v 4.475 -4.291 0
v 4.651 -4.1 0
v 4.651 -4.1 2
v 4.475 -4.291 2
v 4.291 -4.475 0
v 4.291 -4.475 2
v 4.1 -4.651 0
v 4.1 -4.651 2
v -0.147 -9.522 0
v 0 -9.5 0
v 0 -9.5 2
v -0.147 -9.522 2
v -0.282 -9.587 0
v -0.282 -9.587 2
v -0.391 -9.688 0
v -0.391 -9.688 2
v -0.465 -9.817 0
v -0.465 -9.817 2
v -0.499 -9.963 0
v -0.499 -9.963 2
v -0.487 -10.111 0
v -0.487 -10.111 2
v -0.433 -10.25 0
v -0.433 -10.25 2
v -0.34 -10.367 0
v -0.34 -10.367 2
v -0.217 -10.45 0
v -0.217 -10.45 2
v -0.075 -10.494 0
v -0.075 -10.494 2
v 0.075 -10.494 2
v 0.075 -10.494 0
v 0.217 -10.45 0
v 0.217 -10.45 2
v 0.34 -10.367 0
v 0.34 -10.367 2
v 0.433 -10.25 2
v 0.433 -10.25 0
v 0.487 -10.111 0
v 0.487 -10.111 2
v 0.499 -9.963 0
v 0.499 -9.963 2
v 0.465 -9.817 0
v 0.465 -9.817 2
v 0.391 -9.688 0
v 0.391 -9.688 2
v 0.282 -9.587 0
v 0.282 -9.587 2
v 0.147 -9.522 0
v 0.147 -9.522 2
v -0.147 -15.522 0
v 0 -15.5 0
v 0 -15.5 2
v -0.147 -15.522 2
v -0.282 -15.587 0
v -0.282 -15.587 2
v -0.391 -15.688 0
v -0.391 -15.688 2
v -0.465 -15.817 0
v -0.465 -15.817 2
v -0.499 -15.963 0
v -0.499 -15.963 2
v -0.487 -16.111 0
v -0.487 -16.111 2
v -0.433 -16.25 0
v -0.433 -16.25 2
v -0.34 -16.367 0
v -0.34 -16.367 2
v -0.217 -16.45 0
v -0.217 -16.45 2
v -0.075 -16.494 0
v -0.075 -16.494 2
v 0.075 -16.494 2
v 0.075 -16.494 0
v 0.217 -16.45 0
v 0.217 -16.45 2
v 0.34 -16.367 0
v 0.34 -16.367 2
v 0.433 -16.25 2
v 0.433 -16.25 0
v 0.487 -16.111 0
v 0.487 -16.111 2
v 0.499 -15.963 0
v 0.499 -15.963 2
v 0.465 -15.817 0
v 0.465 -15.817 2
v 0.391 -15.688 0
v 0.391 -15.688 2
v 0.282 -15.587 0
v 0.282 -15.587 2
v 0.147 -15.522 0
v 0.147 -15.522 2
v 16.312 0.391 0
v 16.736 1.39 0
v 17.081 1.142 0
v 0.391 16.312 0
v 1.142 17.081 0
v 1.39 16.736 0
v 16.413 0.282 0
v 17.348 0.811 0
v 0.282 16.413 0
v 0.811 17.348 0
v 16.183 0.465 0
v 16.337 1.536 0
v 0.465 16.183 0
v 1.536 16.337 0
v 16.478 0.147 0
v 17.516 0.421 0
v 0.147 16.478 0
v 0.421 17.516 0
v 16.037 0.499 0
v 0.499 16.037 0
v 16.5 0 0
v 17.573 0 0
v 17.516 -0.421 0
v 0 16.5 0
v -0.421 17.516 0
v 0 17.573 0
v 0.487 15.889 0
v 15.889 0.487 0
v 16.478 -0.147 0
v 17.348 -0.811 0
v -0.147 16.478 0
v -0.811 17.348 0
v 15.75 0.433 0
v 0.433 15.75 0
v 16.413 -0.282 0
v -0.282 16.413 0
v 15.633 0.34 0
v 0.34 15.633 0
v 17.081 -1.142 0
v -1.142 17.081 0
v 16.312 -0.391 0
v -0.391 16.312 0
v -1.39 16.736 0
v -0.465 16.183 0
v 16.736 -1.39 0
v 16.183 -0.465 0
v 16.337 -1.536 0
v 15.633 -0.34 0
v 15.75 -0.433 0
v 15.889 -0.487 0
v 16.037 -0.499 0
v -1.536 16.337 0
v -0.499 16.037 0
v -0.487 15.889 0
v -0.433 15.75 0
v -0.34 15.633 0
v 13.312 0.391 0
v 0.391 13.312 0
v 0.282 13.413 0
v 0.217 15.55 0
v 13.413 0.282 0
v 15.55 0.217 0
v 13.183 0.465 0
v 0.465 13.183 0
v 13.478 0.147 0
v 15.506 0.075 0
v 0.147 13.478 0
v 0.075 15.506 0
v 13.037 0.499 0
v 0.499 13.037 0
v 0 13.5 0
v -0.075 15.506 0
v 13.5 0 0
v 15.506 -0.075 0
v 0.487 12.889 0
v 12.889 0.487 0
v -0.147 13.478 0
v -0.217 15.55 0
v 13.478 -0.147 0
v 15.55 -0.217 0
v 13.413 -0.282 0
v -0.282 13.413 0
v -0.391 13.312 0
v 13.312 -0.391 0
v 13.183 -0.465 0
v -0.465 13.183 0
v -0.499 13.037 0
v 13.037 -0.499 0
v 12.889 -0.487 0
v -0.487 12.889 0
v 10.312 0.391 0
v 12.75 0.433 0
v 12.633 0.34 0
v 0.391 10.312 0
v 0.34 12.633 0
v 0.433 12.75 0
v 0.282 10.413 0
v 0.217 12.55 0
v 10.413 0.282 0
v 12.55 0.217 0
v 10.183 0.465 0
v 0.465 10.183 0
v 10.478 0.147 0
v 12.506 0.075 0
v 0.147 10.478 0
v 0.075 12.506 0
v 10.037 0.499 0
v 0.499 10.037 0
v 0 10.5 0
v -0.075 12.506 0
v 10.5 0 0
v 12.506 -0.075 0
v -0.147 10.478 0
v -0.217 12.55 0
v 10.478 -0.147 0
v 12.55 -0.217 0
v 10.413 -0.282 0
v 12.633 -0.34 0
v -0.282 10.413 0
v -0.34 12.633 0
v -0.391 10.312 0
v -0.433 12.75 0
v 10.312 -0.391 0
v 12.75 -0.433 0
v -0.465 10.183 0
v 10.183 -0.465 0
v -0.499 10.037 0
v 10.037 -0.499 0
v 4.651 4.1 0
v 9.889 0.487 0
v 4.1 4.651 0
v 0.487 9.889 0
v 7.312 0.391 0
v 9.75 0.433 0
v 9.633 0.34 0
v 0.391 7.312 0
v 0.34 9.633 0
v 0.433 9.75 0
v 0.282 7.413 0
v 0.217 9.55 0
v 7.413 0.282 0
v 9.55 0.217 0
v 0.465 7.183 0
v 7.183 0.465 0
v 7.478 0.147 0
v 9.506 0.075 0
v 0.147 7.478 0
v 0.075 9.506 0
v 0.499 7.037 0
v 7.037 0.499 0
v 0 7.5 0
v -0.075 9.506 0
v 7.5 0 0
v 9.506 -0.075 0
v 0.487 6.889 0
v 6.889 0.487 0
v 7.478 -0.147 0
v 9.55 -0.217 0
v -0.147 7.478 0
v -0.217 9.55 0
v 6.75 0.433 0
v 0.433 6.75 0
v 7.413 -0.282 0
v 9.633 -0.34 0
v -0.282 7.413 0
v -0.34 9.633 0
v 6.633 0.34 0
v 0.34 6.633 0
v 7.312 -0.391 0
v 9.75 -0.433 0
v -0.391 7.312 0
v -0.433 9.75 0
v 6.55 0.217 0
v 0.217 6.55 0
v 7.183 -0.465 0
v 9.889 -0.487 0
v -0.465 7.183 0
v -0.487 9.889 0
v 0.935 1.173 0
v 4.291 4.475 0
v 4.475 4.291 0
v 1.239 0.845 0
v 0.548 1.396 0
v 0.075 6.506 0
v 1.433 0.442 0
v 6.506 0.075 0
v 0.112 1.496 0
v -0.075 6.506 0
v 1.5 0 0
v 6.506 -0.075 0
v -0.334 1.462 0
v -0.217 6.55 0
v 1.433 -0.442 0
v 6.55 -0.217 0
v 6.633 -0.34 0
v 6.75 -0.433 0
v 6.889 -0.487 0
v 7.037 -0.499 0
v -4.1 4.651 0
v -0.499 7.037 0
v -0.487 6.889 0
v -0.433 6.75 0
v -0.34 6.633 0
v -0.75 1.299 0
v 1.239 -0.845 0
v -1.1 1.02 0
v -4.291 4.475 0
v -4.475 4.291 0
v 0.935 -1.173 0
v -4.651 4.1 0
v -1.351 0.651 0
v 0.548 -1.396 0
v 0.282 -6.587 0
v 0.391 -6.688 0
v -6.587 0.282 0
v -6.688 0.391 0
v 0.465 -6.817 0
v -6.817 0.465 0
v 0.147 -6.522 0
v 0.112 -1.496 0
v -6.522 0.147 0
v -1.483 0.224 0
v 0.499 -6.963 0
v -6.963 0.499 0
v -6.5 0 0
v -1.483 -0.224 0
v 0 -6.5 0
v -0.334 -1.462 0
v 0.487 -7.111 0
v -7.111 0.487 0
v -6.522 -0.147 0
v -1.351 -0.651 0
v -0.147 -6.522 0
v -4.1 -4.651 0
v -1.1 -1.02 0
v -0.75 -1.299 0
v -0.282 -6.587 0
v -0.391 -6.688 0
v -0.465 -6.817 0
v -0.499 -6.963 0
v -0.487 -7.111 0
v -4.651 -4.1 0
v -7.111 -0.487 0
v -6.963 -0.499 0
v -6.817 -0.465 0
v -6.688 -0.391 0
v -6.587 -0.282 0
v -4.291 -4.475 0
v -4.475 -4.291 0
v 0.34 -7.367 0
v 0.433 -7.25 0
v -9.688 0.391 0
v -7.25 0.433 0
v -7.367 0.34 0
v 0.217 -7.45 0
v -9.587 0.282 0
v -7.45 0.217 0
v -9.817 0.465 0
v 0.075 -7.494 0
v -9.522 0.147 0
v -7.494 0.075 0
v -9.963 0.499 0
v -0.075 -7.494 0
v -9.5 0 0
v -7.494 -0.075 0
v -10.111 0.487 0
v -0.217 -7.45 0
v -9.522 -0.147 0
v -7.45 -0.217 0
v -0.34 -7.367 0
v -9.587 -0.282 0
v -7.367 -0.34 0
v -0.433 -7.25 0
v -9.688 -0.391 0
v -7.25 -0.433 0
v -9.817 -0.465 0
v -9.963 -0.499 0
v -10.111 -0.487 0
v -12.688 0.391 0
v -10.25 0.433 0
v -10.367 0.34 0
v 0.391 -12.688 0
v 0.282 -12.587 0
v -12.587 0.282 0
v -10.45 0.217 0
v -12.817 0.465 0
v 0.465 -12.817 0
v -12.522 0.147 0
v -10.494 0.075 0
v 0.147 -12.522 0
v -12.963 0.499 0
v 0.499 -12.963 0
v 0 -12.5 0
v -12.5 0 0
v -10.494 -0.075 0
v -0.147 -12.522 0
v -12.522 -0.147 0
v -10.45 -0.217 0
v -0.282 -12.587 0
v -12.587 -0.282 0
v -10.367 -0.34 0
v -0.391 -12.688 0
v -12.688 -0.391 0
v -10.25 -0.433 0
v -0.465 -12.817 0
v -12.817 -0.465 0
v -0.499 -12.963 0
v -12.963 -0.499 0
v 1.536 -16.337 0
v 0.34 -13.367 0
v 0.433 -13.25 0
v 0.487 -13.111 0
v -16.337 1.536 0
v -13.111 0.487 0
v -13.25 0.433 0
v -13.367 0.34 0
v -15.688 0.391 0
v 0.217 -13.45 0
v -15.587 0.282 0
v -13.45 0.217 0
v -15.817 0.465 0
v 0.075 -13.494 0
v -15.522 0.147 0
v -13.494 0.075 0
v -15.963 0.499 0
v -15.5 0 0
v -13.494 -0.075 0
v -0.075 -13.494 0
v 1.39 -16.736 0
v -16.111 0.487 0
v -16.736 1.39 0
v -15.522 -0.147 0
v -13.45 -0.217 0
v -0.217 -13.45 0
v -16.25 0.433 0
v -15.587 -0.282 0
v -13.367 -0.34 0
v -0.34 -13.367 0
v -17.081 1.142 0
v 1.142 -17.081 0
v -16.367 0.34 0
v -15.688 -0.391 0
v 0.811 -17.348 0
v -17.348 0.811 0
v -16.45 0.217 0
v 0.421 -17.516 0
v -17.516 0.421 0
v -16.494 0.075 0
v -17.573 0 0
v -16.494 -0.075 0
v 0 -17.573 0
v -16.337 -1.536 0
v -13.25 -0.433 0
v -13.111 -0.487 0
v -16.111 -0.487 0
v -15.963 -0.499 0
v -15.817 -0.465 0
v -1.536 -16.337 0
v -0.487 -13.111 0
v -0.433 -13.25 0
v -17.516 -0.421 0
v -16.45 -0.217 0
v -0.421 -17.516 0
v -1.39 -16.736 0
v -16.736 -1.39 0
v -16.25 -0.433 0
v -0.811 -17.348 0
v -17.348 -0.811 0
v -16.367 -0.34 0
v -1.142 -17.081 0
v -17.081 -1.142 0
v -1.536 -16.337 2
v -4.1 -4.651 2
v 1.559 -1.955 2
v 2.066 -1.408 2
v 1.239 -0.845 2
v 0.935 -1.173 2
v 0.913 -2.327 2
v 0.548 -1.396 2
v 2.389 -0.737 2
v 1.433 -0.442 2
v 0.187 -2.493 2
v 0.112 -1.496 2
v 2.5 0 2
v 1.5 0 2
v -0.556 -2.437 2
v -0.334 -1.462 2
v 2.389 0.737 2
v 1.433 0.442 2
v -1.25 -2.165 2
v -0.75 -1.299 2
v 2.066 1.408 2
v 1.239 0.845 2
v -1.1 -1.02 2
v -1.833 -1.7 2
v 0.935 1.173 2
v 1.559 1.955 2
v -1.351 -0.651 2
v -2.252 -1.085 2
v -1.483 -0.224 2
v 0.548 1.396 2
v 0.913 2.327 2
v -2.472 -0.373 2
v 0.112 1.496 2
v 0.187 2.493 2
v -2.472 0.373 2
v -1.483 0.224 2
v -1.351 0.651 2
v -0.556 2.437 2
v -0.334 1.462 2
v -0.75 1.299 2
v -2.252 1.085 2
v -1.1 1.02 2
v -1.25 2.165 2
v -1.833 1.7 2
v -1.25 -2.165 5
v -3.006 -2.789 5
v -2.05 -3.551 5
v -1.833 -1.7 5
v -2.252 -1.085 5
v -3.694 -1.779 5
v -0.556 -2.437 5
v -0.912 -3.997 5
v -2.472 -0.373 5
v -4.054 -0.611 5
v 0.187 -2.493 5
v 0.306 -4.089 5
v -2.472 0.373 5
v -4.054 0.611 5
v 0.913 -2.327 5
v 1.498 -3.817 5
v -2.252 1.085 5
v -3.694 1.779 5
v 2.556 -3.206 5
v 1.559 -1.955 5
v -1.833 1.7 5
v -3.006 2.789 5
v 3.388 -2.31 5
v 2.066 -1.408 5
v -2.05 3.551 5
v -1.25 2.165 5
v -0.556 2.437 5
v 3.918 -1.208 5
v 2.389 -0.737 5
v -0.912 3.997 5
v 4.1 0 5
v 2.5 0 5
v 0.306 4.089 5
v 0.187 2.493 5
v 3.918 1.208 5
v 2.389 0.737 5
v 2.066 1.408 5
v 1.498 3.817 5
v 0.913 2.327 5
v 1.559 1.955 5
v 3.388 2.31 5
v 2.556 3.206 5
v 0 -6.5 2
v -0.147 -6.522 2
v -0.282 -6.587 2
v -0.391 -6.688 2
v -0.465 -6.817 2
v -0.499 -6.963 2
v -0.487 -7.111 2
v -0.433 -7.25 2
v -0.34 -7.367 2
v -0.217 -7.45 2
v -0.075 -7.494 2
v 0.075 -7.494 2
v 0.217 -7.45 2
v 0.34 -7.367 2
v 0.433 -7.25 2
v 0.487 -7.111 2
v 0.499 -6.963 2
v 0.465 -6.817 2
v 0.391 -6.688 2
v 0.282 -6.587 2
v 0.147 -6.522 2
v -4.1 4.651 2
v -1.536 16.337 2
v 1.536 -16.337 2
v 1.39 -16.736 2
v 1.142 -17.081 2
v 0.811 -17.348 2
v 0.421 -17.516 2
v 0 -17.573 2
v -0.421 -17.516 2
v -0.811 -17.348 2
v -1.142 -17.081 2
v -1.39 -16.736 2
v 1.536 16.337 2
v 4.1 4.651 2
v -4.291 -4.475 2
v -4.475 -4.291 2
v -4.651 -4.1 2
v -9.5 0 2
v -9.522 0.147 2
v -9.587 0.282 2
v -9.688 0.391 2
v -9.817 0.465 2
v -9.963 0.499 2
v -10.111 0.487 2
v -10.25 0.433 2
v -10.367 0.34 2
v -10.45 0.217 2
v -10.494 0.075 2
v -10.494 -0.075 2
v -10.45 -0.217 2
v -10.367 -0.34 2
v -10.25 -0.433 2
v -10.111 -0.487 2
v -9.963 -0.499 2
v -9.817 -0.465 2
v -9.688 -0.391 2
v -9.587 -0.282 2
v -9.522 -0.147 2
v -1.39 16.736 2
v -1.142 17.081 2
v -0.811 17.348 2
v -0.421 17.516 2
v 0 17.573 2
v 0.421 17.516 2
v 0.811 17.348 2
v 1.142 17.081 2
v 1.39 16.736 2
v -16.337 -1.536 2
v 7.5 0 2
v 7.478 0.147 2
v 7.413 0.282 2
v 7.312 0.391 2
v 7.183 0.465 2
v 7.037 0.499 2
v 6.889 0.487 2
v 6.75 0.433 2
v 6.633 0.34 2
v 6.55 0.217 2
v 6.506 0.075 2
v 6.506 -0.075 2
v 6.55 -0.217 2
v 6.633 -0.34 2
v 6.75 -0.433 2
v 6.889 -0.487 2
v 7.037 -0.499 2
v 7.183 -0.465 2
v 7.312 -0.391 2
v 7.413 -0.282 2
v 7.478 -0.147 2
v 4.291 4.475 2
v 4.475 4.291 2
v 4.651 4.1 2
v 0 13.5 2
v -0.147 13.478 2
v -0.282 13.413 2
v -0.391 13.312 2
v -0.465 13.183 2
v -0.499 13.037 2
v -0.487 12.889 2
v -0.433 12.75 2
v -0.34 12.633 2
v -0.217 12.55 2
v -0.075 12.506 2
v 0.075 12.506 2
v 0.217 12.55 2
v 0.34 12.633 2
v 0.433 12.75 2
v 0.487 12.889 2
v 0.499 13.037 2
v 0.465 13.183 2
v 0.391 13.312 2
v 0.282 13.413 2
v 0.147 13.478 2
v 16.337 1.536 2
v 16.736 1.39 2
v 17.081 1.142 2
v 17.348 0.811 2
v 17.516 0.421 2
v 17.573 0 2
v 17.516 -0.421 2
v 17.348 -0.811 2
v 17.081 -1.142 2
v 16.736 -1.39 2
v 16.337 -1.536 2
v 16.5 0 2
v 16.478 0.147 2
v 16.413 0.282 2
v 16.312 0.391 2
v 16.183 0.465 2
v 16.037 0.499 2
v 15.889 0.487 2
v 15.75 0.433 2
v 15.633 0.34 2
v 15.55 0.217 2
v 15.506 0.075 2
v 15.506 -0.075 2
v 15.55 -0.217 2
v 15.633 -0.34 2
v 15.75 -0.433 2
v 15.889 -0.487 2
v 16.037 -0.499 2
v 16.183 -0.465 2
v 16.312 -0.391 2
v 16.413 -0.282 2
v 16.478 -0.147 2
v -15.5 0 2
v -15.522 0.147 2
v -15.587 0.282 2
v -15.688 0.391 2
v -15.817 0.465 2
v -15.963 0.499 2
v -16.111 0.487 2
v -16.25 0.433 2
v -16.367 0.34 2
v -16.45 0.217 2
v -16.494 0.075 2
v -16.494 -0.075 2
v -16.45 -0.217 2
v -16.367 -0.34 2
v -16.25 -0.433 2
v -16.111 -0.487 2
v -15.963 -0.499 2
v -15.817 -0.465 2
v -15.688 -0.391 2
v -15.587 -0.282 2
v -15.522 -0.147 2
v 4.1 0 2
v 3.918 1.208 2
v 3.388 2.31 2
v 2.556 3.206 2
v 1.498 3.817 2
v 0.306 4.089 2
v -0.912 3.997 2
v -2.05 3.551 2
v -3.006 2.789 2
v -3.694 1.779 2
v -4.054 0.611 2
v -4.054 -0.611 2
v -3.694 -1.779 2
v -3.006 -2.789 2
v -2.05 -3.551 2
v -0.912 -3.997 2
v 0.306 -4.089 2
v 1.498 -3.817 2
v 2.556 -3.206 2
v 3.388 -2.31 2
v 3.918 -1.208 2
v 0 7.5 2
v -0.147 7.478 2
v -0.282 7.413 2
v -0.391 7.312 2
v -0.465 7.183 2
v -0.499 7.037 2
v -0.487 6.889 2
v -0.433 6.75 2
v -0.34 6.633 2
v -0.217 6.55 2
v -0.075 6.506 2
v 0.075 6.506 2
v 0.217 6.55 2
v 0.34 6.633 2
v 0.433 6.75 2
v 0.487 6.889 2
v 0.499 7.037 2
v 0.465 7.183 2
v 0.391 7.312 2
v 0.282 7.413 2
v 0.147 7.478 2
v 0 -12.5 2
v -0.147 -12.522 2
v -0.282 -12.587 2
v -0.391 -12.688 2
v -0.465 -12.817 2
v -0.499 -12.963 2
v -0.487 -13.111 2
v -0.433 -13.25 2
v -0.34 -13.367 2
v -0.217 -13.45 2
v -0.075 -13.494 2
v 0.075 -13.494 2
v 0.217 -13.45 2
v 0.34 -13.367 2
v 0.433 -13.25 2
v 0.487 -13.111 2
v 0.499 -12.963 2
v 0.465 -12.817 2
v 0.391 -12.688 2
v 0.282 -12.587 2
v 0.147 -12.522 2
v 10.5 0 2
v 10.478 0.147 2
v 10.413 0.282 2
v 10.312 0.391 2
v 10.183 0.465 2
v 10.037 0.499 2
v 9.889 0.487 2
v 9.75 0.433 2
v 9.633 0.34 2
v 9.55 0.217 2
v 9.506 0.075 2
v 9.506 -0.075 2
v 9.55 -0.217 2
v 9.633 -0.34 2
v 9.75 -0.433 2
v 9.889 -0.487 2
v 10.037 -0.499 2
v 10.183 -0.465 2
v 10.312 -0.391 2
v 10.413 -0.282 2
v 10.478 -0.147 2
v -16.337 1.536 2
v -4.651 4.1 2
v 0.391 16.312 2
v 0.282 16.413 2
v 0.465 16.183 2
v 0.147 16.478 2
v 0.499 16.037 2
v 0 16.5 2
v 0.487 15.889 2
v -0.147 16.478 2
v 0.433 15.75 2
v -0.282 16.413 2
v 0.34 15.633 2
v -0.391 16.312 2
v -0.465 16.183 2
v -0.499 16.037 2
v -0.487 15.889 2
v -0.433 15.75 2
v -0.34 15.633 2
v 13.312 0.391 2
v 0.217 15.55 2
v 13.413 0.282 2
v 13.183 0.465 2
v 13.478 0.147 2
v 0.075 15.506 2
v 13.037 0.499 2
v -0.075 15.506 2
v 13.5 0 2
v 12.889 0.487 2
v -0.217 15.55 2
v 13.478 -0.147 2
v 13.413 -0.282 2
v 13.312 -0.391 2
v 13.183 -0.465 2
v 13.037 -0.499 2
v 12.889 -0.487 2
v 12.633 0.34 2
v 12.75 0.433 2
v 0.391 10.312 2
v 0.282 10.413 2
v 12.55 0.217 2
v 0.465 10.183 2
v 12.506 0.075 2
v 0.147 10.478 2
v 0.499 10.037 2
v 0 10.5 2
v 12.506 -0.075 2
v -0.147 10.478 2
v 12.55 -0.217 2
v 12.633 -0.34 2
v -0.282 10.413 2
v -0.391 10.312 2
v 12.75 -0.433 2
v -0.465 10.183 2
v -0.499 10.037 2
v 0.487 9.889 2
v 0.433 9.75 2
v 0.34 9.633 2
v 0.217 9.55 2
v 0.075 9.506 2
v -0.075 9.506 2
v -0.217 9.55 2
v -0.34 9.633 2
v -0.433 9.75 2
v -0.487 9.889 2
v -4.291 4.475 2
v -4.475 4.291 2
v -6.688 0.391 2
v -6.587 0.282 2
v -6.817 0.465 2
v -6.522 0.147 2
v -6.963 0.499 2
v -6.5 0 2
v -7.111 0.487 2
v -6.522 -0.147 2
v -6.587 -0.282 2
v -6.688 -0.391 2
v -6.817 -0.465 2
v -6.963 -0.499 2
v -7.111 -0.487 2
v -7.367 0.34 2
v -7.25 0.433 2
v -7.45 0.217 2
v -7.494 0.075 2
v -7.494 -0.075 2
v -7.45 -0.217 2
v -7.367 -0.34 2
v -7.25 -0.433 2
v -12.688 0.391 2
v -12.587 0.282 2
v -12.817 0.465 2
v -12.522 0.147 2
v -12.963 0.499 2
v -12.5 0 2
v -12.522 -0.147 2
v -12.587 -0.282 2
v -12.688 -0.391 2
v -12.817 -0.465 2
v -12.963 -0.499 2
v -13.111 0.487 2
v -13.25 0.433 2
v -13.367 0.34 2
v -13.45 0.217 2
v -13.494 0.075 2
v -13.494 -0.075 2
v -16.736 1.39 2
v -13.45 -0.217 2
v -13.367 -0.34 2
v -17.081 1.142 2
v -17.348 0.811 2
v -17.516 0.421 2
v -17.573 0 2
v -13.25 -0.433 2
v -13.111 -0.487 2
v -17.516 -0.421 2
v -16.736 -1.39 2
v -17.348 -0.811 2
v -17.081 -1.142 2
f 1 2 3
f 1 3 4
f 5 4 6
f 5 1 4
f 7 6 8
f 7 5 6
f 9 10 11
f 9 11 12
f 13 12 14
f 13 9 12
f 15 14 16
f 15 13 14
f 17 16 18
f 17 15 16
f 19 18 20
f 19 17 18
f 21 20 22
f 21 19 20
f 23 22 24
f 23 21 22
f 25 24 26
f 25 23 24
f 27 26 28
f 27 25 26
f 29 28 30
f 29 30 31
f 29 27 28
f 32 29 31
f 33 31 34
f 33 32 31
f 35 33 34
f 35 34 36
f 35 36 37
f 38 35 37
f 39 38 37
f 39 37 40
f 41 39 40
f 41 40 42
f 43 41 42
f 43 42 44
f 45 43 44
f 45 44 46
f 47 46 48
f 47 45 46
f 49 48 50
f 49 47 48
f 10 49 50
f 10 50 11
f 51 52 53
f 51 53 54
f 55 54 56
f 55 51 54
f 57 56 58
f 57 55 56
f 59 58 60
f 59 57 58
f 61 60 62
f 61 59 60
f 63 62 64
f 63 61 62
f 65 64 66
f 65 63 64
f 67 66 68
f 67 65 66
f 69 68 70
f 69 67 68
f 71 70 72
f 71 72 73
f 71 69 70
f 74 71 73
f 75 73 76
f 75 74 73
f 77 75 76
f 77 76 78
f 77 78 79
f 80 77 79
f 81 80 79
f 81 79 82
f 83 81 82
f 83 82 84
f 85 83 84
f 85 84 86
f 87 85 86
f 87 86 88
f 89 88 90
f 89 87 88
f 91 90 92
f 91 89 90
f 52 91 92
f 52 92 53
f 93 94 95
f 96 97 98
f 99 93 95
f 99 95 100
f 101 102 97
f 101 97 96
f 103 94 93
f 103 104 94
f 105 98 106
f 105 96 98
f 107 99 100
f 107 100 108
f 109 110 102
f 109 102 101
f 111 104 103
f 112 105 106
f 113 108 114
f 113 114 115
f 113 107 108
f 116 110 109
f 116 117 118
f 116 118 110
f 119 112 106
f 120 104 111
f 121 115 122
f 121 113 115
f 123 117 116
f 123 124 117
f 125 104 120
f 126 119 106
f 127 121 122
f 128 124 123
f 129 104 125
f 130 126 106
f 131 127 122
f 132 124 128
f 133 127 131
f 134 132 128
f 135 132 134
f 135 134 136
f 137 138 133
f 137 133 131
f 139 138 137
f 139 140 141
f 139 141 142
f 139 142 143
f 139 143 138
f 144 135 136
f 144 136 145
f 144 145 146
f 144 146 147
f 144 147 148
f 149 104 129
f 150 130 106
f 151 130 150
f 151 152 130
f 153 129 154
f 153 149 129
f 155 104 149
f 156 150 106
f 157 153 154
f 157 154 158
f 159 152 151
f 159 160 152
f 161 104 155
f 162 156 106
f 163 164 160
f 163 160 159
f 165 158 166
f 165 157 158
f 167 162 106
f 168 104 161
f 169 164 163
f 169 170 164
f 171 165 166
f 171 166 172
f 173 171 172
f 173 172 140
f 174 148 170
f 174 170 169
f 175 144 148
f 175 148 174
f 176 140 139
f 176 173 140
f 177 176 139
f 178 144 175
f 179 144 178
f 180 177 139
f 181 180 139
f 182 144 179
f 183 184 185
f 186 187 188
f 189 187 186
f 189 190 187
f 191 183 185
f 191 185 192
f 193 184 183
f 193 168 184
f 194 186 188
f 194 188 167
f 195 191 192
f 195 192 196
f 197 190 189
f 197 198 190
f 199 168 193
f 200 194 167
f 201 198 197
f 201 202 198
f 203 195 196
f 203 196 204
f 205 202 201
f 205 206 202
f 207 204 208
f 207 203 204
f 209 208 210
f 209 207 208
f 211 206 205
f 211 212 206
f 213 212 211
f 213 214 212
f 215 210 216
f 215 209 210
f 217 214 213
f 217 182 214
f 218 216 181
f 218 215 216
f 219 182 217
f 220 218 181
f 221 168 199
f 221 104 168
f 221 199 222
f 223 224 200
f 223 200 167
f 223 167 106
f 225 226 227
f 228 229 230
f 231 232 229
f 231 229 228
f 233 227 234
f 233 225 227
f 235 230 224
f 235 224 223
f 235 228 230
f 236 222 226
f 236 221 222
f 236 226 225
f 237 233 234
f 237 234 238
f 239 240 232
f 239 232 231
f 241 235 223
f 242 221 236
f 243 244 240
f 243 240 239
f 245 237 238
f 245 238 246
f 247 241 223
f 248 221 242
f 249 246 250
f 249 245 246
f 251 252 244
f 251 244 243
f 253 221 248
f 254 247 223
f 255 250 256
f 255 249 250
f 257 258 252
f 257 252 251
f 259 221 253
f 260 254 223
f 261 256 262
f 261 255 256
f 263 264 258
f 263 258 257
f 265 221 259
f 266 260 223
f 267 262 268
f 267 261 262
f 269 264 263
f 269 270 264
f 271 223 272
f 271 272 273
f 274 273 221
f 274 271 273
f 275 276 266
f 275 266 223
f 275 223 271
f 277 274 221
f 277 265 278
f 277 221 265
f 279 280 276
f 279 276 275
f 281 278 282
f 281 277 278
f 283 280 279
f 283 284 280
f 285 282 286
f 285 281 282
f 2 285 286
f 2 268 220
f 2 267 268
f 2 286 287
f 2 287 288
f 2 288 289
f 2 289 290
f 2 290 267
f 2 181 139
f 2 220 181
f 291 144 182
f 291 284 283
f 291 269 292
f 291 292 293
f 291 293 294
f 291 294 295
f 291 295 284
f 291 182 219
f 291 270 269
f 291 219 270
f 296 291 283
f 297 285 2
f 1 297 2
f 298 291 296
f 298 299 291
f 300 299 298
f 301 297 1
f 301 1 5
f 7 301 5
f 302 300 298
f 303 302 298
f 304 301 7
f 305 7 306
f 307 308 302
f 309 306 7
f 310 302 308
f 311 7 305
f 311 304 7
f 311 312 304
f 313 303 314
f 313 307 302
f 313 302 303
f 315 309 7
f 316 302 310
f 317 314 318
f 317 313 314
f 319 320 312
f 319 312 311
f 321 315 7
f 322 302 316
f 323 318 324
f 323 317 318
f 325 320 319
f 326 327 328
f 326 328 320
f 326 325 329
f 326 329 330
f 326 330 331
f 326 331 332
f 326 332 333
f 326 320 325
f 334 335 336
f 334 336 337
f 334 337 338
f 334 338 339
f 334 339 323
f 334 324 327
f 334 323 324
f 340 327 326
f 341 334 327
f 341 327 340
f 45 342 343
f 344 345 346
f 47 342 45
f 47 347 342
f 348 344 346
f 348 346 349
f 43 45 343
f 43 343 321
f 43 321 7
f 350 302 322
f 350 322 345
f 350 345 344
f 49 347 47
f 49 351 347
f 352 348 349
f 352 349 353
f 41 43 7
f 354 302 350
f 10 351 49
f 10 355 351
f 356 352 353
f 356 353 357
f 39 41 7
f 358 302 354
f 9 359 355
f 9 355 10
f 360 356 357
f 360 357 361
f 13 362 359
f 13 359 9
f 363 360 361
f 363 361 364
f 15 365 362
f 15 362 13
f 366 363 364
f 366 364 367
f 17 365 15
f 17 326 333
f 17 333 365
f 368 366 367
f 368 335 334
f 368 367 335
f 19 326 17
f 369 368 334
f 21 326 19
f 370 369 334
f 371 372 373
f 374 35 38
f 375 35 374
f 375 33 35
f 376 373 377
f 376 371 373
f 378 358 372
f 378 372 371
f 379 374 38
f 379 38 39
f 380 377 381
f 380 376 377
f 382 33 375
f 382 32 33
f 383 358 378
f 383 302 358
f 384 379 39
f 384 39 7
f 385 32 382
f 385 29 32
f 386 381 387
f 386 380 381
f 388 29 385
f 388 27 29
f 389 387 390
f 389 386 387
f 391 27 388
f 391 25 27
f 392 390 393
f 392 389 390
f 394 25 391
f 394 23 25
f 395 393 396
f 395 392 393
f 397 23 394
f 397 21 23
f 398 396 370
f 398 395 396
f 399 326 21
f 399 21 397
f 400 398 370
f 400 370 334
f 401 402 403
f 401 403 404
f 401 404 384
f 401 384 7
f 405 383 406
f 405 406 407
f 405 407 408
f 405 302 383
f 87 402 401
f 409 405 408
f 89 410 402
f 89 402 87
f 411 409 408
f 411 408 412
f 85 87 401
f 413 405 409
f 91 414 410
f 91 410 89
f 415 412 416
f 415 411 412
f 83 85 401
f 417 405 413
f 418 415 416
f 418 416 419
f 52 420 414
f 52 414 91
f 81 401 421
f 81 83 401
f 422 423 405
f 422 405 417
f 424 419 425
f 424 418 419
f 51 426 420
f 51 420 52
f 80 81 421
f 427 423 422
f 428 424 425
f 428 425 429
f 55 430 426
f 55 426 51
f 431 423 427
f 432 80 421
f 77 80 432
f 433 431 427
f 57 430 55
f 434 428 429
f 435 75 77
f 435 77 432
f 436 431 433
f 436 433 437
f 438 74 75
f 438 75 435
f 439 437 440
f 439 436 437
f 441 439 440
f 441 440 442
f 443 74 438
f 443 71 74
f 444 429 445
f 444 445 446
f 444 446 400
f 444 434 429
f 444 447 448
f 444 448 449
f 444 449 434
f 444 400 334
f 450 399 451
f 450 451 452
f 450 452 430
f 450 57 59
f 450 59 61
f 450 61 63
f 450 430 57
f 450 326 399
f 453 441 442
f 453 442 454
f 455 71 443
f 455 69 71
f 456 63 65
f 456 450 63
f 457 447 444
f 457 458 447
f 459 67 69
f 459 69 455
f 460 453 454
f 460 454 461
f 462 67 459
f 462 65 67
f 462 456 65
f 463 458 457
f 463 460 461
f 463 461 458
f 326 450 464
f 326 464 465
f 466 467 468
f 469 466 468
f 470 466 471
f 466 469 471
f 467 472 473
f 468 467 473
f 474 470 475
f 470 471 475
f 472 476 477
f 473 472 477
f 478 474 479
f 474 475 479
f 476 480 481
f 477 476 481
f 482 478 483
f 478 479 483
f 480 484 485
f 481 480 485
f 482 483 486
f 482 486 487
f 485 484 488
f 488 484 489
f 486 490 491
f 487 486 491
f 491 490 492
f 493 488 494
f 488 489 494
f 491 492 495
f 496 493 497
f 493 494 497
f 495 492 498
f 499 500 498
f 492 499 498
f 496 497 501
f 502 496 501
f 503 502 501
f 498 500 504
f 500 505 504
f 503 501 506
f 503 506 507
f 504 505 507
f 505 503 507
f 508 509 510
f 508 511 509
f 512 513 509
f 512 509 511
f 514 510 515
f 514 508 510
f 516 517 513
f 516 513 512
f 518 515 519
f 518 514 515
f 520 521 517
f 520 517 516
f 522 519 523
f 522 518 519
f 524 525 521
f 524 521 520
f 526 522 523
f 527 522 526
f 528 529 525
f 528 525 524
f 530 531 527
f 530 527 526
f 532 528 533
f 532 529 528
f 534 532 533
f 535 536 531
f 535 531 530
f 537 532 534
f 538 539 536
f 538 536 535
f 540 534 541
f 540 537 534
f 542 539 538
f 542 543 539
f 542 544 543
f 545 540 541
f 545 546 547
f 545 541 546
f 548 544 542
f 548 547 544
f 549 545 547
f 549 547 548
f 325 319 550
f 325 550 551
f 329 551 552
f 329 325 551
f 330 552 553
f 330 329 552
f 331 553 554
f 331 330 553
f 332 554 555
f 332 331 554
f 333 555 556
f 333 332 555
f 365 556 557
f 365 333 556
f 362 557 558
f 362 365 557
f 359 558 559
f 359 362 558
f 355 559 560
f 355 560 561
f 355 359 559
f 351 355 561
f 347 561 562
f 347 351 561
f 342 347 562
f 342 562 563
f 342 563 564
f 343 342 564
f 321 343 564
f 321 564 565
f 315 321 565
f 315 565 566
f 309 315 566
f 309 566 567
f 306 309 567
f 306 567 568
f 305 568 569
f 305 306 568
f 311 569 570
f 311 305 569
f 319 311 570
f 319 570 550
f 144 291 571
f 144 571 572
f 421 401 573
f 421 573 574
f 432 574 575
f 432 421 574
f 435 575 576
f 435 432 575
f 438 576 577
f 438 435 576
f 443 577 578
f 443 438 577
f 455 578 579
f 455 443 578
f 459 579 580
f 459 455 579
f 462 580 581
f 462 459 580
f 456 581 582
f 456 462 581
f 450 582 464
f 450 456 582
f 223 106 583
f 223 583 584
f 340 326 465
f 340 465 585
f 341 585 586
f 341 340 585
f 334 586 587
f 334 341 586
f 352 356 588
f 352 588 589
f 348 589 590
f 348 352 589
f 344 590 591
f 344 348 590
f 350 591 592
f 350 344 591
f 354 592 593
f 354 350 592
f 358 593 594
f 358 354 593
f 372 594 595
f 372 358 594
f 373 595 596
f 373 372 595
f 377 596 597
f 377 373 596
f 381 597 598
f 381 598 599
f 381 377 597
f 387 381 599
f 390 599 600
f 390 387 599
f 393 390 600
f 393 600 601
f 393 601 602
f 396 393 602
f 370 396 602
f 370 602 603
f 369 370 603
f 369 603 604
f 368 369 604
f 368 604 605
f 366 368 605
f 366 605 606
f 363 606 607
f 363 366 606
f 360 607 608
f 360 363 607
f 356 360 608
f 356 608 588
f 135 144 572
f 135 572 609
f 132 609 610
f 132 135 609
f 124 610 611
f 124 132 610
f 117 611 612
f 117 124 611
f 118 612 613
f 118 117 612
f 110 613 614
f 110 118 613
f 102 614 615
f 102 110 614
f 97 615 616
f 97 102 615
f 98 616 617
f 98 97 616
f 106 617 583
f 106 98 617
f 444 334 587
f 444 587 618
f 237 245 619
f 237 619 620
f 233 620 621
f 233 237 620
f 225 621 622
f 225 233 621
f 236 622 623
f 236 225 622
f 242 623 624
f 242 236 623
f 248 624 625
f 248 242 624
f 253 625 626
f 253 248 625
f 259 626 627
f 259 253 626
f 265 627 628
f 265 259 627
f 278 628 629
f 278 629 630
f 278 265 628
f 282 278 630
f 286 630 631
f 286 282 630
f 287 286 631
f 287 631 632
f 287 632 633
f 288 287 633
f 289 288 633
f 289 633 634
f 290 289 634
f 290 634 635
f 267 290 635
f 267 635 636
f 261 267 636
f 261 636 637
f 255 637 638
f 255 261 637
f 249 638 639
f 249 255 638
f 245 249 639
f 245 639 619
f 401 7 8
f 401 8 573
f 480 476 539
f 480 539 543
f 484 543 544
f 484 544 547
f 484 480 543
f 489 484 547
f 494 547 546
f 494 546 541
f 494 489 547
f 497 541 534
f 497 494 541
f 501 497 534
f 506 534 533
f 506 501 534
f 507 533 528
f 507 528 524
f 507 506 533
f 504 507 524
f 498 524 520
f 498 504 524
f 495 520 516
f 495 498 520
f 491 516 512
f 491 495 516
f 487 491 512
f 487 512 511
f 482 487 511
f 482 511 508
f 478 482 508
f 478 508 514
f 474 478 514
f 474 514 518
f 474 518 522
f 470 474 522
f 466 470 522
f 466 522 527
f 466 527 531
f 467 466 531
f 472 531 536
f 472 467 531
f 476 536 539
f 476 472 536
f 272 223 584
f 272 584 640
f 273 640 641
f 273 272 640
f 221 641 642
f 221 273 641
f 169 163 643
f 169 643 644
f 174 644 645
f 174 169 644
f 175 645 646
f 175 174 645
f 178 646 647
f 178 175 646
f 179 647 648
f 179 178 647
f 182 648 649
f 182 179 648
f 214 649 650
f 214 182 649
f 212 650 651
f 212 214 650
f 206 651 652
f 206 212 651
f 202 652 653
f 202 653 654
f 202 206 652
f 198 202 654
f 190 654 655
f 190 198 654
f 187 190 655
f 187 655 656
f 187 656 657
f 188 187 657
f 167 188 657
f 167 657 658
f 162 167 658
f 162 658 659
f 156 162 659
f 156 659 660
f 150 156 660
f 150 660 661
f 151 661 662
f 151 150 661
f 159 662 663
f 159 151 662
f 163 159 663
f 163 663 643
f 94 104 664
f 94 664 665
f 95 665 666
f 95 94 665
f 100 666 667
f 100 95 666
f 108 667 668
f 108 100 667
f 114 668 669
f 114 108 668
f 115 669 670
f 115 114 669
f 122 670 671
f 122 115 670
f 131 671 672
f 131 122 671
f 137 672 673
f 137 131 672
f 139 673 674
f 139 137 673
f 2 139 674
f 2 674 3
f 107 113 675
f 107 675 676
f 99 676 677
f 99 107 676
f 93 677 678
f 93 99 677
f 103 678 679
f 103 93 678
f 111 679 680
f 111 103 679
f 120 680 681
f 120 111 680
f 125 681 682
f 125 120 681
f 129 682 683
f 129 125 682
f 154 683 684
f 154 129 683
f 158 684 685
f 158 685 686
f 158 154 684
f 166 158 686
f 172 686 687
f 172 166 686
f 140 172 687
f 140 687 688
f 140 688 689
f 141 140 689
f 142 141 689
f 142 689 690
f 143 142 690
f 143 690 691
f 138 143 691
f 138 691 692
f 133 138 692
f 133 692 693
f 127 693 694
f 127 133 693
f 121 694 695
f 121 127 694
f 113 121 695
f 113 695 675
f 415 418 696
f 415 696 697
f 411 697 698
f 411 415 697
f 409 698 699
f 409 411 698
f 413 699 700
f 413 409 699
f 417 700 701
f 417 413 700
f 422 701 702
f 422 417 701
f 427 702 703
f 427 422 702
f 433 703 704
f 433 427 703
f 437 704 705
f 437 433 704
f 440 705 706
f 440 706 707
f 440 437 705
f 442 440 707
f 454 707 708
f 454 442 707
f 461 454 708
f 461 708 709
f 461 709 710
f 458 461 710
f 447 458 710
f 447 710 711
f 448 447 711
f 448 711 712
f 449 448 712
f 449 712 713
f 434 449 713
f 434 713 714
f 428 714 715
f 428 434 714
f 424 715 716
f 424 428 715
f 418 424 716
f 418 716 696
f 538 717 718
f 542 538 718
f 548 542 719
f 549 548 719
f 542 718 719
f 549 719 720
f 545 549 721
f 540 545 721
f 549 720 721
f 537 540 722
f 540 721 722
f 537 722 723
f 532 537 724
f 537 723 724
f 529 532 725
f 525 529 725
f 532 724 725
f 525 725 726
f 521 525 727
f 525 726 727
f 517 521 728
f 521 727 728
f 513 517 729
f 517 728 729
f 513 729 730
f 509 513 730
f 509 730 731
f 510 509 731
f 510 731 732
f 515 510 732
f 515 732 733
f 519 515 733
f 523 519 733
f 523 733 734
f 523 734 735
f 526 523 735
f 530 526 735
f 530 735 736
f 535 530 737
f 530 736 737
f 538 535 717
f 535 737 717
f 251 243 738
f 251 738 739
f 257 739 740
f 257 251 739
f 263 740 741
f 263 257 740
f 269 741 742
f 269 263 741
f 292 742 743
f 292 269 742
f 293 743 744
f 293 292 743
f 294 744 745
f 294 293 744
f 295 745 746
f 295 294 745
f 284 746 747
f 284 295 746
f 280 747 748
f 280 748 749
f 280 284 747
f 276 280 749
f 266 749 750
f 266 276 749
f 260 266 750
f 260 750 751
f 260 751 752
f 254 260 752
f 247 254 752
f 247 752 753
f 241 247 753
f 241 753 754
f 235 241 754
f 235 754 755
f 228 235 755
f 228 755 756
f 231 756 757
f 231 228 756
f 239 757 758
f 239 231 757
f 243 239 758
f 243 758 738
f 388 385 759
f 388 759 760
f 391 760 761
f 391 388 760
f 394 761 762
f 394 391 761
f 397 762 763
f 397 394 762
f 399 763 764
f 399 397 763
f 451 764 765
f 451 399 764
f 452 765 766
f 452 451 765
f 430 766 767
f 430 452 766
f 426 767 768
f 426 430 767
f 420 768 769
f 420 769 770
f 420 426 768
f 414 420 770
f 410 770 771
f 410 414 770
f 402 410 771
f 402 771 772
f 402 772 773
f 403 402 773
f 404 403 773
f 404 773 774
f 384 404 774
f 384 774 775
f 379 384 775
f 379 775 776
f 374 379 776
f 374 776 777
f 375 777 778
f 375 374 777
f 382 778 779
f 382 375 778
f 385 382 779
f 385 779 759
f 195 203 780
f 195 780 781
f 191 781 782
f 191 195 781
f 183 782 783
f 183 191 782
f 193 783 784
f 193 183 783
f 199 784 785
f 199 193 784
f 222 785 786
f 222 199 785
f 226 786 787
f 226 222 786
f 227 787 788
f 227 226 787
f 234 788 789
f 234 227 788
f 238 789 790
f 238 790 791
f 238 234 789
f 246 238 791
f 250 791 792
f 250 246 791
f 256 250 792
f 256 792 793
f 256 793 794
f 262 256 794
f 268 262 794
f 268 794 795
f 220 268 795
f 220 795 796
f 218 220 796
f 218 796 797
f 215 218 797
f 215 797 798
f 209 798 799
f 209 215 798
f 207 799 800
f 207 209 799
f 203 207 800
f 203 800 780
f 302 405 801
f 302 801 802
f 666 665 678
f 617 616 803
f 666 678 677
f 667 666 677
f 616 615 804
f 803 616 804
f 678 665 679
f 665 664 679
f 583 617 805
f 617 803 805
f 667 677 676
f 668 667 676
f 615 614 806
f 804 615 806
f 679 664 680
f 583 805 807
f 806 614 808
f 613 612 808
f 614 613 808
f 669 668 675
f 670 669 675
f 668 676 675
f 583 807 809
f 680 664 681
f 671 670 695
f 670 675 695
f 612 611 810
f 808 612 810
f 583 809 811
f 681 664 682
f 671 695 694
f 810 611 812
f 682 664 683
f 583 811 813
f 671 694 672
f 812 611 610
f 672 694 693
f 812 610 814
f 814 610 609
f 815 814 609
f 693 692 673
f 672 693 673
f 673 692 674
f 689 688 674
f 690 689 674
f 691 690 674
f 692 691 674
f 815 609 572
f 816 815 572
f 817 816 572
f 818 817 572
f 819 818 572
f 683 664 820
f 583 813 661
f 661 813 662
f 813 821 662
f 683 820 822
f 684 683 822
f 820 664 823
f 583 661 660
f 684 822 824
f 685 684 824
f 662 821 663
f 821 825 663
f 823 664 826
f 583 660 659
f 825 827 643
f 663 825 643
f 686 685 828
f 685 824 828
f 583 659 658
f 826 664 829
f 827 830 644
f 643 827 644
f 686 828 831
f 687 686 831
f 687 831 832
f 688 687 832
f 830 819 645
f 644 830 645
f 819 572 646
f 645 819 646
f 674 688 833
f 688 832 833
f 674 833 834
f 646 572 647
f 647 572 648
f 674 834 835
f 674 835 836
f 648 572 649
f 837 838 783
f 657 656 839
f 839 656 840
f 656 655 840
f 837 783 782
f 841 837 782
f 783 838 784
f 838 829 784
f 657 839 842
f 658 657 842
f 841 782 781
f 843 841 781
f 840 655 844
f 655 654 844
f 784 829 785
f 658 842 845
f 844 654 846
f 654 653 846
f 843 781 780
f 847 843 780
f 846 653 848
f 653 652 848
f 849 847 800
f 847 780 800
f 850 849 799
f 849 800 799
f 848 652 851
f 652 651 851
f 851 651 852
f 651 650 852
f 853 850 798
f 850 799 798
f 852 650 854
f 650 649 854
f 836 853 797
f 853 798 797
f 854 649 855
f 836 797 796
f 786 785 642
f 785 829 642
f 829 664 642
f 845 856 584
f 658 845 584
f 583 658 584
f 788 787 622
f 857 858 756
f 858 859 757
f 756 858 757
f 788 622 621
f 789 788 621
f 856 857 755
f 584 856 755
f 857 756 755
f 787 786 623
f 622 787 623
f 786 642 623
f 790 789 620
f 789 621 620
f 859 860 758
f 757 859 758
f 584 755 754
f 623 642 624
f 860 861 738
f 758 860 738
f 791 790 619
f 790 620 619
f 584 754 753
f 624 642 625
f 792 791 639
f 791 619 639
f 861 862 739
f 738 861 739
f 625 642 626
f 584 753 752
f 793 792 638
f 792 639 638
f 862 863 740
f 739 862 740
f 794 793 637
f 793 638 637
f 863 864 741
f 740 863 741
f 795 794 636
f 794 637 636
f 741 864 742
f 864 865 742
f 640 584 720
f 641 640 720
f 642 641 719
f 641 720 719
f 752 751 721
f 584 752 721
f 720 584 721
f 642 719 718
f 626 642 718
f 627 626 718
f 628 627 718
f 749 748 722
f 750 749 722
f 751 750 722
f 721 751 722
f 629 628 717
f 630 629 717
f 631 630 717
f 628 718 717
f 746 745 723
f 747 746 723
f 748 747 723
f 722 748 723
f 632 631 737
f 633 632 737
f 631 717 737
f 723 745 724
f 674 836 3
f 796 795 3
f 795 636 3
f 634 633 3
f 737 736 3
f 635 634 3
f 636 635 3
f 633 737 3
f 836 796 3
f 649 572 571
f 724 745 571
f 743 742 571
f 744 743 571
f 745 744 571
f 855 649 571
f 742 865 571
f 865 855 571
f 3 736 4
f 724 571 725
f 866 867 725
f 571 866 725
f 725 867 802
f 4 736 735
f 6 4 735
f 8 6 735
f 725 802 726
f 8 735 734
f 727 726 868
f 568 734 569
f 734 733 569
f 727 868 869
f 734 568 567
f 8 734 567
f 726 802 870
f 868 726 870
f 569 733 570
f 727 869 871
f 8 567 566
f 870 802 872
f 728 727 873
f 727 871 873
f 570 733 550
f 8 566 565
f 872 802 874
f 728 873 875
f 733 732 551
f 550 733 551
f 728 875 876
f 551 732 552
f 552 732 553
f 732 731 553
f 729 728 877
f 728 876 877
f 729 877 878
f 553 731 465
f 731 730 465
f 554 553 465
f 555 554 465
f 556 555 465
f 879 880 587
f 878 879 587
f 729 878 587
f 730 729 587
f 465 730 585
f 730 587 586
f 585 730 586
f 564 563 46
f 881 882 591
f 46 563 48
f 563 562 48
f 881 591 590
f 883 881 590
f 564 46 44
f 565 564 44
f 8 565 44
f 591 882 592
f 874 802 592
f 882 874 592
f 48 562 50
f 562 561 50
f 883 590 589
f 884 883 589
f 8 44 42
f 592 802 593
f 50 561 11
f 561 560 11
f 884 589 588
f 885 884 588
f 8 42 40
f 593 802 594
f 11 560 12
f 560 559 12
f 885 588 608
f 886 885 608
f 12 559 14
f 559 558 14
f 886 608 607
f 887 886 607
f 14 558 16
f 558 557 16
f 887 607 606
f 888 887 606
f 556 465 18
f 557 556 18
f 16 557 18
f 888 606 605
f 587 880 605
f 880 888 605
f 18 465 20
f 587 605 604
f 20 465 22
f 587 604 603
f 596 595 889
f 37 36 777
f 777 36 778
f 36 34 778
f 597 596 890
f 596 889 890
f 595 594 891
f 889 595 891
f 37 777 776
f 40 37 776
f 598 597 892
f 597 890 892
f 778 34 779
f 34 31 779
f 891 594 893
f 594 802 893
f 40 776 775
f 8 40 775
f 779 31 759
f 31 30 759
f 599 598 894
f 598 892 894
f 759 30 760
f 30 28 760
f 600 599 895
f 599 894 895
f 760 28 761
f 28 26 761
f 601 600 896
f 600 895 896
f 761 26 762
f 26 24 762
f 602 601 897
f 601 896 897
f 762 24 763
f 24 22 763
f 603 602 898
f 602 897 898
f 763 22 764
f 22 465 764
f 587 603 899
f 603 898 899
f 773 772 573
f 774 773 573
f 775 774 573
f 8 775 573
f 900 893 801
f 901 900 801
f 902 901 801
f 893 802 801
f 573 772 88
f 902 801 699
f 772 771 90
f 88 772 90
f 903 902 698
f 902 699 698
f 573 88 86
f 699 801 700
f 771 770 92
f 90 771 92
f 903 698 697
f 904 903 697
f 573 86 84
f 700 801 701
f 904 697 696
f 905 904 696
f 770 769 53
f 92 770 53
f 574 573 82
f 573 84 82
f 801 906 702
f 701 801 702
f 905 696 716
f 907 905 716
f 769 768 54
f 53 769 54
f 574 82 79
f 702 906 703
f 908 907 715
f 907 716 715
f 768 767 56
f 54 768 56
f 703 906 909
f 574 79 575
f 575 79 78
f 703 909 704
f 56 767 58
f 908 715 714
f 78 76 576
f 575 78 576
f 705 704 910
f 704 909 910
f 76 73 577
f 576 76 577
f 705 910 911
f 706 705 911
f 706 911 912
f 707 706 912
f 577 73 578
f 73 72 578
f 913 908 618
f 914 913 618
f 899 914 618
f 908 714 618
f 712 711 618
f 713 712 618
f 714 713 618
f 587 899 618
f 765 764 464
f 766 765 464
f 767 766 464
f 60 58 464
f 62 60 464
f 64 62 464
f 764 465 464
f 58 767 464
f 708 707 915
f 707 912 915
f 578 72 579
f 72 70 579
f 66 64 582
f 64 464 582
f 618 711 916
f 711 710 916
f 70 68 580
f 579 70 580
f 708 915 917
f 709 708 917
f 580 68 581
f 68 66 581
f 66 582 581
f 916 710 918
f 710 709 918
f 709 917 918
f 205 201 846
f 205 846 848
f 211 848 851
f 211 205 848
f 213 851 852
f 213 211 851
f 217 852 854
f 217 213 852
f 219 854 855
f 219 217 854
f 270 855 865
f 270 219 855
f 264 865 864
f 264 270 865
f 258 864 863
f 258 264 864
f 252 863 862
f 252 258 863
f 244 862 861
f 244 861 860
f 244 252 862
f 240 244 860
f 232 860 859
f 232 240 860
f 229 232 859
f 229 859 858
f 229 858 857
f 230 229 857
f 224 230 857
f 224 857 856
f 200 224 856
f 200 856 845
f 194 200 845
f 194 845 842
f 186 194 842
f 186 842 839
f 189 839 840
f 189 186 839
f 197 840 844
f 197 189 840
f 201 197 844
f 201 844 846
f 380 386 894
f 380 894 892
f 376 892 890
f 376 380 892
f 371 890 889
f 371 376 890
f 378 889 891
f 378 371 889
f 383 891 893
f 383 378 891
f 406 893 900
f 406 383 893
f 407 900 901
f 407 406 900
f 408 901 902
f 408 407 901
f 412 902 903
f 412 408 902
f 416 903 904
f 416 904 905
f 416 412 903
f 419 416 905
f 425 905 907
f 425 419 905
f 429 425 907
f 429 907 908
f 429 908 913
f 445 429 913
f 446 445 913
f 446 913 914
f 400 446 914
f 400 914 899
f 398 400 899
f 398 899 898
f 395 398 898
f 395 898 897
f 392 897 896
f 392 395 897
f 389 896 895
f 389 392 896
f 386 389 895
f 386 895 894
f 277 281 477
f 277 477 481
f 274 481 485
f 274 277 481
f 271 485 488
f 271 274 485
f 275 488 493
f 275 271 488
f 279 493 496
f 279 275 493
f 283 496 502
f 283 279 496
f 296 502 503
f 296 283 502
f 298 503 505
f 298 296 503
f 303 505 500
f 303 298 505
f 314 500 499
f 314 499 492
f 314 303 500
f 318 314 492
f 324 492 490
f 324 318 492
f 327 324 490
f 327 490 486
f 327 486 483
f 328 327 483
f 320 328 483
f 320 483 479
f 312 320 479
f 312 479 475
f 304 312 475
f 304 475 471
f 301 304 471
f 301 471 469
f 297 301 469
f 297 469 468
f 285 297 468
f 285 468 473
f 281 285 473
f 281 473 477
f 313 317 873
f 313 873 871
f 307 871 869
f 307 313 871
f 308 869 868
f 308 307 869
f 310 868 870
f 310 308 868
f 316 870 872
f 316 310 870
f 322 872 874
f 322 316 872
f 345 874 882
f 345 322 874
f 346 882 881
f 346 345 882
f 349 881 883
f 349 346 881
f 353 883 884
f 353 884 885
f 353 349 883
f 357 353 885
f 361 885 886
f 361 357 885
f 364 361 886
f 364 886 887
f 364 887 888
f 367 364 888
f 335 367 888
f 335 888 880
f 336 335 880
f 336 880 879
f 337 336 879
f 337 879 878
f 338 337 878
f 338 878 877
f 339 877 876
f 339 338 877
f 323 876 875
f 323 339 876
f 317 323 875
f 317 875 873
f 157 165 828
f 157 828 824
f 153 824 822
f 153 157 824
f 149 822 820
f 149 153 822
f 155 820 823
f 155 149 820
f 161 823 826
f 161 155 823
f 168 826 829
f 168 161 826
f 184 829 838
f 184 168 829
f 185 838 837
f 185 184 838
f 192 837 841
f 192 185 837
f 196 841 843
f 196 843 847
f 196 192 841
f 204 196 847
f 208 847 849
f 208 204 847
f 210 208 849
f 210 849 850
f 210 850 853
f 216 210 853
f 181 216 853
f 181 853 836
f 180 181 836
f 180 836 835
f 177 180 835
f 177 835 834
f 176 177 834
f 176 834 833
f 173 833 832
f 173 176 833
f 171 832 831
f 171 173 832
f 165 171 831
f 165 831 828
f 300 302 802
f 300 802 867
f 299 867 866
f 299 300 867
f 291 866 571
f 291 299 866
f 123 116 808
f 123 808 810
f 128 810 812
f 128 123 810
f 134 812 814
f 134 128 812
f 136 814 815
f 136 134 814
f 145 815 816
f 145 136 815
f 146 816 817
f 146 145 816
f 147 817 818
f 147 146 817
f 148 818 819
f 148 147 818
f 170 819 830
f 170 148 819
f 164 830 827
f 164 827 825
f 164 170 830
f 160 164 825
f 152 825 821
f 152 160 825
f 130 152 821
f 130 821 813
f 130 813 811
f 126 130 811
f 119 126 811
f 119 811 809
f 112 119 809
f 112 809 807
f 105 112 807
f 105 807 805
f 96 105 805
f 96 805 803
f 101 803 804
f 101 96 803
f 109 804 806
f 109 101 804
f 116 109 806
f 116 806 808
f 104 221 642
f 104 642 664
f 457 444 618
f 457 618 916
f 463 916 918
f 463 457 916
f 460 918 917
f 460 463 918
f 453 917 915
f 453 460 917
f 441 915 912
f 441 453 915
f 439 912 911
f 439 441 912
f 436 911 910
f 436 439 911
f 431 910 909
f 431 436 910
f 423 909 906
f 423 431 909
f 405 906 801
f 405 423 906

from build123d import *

# Parameters (mm, degrees)
ESQUISSE1_R                  = 1.5
ESQUISSE1_R_2                = 0.5
BOSS_EXTRU_1_DEPTH           = 2
ESQUISSE2_R                  = 4.1
ESQUISSE2_R_2                = 2.5
BOSS_EXTRU_2_DEPTH           = 3
R_P_TITION_CIRCULAIRE1_COUNT = 2
R_P_TITION_CIRCULAIRE1_ANGLE = 90


with BuildPart() as part:
    # Esquisse1 → Boss.-Extru.1 (new body)
    with BuildSketch(Plane.XY):
        with BuildLine():
            Line((-16.337044695, 1.536467752), (-4.650806382, 4.1))
            ThreePointArc((-4.650806382, 4.1), (0, 6.2), (4.650806382, 4.1))
            Line((4.650806382, 4.1), (16.337044695, 1.536467752))
            ThreePointArc((16.337044695, 1.536467752), (17.573001042, 0), (16.337044695, -1.536467752))
            Line((16.337044695, -1.536467752), (4.650806382, -4.1))
            ThreePointArc((4.650806382, -4.1), (0, -6.2), (-4.650806382, -4.1))
            Line((-4.650806382, -4.1), (-16.337044695, -1.536467752))
            ThreePointArc((-16.337044695, -1.536467752), (-17.573001042, 0), (-16.337044695, 1.536467752))
        make_face()
        Circle(ESQUISSE1_R, mode=Mode.SUBTRACT)
        with Locations((7, 0)):
            Circle(ESQUISSE1_R_2, mode=Mode.SUBTRACT)
        with Locations((16, 0)):
            Circle(ESQUISSE1_R_2, mode=Mode.SUBTRACT)
        with Locations((13, 0)):
            Circle(ESQUISSE1_R_2, mode=Mode.SUBTRACT)
        with Locations((10, 0)):
            Circle(ESQUISSE1_R_2, mode=Mode.SUBTRACT)
        with Locations((-16, 0)):
            Circle(ESQUISSE1_R_2, mode=Mode.SUBTRACT)
        with Locations((-13, 0)):
            Circle(ESQUISSE1_R_2, mode=Mode.SUBTRACT)
        with Locations((-10, 0)):
            Circle(ESQUISSE1_R_2, mode=Mode.SUBTRACT)
        with Locations((-7, 0)):
            Circle(ESQUISSE1_R_2, mode=Mode.SUBTRACT)
    boss_extru_1 = extrude(amount=BOSS_EXTRU_1_DEPTH)

    # Esquisse2 → Boss.-Extru.2 (add)
    with BuildSketch(Plane.XY.offset(2)):
        Circle(ESQUISSE2_R)
        Circle(ESQUISSE2_R_2, mode=Mode.SUBTRACT)
    extrude(amount=BOSS_EXTRU_2_DEPTH)

    # Répétition circulaire1: Boss.-Extru.1 ×2 about axis
    r_p_tition_circulaire1_axis = Axis((0, 0, -0.25), (0, 0, 1))
    for i in range(1, R_P_TITION_CIRCULAIRE1_COUNT):
        add(boss_extru_1.rotate(r_p_tition_circulaire1_axis, i * R_P_TITION_CIRCULAIRE1_ANGLE / (R_P_TITION_CIRCULAIRE1_COUNT - 1)))


solid = part.part
